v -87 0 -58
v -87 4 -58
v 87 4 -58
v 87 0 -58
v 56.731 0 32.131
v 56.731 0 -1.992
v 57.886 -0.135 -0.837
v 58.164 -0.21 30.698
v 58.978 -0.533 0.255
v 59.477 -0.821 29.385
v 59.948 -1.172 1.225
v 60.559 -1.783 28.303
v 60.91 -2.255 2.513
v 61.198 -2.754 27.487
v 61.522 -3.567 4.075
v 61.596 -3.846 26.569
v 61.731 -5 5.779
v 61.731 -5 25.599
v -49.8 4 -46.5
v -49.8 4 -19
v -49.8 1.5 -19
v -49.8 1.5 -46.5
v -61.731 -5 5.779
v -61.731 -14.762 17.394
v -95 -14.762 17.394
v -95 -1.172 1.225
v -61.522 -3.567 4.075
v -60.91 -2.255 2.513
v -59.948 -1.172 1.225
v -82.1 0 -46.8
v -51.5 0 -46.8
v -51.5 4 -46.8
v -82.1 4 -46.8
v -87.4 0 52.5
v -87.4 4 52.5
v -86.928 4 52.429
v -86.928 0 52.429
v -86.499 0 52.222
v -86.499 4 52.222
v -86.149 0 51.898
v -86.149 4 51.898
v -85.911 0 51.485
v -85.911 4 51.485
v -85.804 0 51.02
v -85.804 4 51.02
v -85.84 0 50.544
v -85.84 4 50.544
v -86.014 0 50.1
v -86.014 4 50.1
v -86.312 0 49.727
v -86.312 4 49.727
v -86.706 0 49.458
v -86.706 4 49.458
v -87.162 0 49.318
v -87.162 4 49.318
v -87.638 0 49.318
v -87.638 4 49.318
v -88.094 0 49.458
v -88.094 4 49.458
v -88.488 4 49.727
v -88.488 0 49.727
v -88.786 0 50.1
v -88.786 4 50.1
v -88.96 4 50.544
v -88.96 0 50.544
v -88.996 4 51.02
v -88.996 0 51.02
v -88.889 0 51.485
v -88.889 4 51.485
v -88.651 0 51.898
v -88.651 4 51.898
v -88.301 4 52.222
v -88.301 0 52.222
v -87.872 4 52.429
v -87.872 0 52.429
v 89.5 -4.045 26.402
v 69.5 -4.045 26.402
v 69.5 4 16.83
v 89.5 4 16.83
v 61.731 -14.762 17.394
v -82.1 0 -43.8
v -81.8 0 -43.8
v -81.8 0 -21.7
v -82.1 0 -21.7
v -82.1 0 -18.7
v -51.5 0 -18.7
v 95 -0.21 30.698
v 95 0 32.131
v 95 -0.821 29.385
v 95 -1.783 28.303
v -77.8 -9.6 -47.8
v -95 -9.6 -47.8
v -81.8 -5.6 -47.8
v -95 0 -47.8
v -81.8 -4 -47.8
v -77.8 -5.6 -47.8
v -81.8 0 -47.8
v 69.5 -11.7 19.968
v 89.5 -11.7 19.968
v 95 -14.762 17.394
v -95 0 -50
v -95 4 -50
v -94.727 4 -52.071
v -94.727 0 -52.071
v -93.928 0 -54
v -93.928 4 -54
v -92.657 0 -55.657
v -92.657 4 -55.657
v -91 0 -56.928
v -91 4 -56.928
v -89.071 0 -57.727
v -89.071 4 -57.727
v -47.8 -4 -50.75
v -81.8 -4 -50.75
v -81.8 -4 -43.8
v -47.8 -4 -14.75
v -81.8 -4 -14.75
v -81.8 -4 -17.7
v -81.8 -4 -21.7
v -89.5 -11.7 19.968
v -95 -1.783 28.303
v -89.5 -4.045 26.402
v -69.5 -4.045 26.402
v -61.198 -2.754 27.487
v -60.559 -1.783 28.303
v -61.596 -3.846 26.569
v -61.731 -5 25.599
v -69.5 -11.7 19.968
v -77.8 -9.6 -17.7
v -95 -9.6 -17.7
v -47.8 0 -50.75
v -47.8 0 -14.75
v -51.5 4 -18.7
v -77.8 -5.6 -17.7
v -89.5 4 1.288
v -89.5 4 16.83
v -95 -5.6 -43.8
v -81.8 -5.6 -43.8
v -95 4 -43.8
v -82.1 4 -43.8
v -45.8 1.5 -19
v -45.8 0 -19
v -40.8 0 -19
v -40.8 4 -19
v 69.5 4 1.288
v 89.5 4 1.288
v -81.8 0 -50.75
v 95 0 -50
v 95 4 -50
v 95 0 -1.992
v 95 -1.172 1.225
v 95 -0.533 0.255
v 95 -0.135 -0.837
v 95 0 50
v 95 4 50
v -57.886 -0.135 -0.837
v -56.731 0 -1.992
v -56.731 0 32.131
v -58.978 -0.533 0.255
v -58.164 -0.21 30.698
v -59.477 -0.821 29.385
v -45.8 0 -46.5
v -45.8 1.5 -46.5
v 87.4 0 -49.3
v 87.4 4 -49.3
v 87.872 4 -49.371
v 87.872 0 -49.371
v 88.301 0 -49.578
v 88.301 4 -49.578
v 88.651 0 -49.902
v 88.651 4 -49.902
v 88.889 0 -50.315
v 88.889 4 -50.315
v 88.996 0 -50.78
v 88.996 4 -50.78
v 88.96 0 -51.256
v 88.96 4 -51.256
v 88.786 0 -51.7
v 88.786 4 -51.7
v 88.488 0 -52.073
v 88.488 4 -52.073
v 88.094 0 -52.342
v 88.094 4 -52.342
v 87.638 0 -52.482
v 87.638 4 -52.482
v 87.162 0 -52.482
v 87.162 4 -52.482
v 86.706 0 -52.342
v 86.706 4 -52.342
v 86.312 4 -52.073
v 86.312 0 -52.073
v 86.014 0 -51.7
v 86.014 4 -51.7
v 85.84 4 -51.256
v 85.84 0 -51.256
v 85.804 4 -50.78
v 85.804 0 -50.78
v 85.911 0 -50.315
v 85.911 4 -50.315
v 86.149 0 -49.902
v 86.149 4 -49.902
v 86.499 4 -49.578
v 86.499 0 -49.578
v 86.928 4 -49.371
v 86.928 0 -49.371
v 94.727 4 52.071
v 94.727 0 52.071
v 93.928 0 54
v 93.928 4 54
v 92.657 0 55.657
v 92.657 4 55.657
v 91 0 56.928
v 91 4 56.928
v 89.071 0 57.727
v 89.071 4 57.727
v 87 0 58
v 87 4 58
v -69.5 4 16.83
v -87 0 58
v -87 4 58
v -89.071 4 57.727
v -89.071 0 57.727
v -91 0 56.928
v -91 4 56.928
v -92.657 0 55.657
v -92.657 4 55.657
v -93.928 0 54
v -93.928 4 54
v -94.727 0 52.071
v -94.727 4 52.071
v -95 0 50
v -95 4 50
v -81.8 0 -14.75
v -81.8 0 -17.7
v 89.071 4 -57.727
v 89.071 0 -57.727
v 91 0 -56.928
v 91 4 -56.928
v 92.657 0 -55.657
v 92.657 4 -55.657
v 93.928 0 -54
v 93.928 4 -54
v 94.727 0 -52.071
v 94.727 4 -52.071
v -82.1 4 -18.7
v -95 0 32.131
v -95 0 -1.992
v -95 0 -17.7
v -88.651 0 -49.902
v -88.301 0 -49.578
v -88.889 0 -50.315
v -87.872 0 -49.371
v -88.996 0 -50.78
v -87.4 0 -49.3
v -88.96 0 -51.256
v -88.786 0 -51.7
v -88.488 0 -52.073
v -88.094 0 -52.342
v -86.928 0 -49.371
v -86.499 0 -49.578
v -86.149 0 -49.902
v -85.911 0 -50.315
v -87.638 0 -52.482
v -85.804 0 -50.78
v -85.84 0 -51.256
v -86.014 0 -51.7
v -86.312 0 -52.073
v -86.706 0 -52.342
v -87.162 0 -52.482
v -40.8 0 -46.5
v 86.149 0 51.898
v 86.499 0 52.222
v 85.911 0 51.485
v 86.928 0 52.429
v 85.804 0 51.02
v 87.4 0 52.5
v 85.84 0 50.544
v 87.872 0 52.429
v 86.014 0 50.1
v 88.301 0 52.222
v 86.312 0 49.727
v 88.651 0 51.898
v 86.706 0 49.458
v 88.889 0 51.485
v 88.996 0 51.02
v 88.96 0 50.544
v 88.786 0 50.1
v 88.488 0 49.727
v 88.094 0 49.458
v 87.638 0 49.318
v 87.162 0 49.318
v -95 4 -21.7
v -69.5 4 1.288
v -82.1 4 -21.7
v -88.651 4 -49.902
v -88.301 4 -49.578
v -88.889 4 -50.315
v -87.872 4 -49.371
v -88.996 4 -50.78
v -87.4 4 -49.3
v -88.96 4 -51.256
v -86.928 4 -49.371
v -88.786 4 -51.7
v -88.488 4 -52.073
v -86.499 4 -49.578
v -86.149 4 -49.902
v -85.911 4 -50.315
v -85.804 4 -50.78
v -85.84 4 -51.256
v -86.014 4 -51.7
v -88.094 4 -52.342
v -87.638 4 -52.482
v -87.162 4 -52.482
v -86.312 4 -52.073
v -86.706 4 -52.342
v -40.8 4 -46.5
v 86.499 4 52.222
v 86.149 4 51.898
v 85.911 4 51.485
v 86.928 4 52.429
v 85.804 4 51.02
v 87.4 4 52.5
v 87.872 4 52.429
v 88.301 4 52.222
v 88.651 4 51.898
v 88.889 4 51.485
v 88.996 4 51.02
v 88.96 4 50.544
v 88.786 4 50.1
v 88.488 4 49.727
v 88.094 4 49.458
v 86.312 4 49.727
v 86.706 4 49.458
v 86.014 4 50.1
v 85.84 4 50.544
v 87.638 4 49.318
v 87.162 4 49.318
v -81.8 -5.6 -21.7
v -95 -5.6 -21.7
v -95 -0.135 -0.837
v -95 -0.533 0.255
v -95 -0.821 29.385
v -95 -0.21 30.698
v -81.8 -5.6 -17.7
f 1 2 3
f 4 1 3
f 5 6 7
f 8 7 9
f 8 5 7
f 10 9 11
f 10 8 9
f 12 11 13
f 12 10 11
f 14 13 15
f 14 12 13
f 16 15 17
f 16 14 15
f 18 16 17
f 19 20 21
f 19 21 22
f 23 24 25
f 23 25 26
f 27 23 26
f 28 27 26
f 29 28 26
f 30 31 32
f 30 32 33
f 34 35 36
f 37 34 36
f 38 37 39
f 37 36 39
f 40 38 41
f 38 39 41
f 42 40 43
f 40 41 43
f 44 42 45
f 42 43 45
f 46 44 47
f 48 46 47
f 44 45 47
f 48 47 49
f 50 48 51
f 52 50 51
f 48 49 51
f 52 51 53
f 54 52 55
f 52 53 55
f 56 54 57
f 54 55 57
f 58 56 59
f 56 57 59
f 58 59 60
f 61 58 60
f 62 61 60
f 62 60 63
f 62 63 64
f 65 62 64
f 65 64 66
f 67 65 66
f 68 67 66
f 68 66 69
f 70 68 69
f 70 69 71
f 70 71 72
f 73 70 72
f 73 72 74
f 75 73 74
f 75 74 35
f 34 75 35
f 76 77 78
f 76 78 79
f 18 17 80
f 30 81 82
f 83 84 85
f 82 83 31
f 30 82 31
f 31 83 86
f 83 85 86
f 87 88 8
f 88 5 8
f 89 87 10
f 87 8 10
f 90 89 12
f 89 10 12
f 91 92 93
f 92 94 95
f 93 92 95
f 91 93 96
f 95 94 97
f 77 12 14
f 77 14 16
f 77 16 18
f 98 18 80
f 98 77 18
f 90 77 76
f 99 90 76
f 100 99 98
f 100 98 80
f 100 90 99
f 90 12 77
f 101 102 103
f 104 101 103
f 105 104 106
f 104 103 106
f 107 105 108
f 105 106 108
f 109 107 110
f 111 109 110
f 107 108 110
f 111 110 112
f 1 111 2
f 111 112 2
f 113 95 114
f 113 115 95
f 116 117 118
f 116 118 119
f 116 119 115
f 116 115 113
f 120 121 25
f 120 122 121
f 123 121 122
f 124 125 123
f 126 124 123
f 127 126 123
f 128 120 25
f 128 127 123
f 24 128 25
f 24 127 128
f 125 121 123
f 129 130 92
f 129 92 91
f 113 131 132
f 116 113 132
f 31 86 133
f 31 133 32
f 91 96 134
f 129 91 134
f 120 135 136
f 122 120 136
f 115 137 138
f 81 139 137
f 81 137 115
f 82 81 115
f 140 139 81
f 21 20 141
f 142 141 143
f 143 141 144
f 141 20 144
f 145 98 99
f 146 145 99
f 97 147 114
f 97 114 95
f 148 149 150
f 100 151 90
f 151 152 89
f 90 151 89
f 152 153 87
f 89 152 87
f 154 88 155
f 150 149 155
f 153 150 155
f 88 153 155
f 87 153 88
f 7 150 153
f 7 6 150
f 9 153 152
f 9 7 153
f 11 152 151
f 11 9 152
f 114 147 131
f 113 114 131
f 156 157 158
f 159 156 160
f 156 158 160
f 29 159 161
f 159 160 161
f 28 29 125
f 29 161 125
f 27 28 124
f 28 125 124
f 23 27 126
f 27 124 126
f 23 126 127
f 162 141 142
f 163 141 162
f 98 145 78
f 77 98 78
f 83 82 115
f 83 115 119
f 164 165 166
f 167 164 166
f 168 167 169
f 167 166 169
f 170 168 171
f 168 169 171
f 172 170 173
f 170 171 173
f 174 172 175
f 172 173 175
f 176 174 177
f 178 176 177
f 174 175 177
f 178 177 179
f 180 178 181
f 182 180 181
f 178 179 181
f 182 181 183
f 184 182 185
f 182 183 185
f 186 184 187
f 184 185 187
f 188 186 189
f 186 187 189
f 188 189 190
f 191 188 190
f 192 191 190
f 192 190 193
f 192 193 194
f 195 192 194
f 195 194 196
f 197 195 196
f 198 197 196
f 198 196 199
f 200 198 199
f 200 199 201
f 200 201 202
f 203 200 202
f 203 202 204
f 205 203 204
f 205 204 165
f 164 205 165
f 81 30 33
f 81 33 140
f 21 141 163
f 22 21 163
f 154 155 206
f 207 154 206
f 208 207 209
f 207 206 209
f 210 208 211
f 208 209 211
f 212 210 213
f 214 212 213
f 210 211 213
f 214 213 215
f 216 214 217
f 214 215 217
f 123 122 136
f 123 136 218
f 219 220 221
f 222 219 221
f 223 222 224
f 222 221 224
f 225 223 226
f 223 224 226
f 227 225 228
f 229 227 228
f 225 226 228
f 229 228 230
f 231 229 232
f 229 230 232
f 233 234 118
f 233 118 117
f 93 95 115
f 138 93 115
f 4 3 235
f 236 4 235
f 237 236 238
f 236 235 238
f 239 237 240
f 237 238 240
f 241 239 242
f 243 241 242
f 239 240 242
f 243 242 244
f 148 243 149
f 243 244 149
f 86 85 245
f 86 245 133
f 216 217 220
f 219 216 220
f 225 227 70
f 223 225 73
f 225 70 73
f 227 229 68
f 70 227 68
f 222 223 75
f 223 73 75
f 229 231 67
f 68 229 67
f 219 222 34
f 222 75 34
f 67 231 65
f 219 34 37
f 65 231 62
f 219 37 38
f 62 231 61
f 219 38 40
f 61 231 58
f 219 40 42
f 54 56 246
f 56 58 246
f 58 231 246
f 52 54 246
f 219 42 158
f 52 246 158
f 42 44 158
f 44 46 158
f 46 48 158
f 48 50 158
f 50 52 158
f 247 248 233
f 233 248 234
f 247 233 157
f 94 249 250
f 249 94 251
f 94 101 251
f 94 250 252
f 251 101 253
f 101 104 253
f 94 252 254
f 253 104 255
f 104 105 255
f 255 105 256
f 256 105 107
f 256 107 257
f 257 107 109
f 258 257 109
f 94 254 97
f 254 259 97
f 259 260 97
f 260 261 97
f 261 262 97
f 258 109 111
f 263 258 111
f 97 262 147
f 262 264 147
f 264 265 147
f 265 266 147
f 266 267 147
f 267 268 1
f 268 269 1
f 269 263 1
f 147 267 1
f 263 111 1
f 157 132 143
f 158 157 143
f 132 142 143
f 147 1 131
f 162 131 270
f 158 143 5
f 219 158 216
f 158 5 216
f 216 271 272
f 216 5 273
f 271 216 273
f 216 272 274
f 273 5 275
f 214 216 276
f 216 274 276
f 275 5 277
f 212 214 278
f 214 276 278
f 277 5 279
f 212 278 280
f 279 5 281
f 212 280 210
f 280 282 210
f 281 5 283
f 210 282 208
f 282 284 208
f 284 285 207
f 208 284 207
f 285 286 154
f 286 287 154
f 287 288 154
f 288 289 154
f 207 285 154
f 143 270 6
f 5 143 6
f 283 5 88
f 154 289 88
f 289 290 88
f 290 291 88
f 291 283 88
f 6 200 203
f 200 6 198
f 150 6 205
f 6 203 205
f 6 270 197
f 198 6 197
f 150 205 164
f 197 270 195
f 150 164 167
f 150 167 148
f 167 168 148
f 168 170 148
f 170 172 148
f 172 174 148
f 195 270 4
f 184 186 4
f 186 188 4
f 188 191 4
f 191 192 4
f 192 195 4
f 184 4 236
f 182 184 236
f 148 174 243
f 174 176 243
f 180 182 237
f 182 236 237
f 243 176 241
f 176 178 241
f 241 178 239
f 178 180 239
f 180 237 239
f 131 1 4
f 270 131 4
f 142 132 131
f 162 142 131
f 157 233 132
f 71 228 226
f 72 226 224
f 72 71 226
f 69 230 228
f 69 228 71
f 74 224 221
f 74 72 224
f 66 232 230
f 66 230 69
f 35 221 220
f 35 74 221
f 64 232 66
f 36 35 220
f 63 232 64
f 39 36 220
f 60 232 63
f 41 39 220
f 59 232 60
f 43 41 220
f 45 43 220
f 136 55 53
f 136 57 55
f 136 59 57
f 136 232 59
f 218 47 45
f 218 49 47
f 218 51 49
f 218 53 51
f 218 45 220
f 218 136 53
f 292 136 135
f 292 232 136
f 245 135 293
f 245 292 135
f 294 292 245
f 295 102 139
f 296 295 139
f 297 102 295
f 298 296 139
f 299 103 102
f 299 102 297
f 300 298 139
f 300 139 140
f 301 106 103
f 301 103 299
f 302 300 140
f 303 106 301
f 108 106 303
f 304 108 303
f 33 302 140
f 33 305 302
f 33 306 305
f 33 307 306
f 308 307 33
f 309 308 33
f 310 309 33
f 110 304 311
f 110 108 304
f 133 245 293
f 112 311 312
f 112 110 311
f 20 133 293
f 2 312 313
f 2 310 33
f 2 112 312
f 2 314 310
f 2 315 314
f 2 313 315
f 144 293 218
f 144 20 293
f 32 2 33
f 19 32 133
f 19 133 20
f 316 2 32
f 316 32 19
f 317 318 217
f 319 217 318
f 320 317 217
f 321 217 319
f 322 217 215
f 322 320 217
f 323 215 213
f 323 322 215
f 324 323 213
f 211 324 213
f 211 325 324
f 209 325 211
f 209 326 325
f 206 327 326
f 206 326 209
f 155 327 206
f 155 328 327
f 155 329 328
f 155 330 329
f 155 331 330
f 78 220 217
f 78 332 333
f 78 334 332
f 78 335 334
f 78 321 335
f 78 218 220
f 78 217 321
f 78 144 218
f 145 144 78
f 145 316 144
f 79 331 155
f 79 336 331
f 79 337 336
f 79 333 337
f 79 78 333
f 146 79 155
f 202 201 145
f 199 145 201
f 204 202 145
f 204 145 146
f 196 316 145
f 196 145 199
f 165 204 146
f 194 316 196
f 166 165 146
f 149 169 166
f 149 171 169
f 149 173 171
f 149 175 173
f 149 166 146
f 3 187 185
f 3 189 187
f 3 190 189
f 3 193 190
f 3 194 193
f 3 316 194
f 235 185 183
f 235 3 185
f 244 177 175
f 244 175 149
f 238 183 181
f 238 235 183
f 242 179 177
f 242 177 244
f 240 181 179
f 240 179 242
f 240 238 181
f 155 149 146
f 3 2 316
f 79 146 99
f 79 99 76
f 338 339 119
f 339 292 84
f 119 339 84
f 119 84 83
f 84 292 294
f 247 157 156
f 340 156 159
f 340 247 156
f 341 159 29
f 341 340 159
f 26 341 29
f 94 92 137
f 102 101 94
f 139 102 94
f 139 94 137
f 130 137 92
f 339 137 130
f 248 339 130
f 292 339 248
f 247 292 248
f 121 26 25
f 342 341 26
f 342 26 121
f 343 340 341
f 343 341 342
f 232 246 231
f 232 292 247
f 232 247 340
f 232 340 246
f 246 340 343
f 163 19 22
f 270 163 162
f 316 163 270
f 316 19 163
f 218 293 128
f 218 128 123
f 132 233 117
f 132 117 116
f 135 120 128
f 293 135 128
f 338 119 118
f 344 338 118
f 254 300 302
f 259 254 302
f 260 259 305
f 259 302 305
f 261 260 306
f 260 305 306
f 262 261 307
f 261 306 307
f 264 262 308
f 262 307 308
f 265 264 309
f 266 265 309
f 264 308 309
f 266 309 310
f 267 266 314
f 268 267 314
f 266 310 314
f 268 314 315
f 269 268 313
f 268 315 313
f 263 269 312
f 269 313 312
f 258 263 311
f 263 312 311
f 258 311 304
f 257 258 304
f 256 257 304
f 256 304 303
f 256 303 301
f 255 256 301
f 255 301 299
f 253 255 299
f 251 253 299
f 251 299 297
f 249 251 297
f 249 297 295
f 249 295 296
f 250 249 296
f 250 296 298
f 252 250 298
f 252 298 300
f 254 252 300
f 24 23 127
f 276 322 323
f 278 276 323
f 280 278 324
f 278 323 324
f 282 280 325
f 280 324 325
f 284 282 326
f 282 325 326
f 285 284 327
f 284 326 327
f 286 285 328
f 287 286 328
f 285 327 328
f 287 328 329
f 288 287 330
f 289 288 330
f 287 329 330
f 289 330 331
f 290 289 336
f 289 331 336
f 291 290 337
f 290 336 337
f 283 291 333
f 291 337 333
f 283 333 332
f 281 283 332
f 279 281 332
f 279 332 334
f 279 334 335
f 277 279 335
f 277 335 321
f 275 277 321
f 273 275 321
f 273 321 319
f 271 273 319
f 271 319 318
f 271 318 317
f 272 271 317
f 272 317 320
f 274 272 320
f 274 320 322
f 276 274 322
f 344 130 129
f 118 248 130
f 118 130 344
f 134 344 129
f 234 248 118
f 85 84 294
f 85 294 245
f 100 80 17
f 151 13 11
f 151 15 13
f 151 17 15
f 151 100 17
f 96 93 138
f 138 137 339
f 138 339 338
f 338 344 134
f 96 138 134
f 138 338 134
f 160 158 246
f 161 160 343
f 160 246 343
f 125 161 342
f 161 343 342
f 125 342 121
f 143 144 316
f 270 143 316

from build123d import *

# Parameters (mm, degrees)
SKETCH_1_W          = 272.533053494
SKETCH_1_H          = 136.587531522
EXTRUDE_1_DEPTH     = 4
SKETCH_2_W          = 272.533053494
SKETCH_2_H          = 136.587531522
CUT_EXTRUDE_1_DEPTH = 4
CUT_EXTRUDE_2_DEPTH = 4
CUT_EXTRUDE_3_DEPTH = 4
SKETCH_5_W          = 34
SKETCH_5_H          = 36
EXTRUDE_2_DEPTH     = 4
SKETCH_6_W          = 13.2
SKETCH_6_H          = 4
EXTRUDE_3_DEPTH     = 5.6
SKETCH_7_W          = 17.2
SKETCH_7_H          = 30.1
EXTRUDE_4_DEPTH     = 4
SKETCH_8_W          = 5
SKETCH_8_H          = 27.5
CUT_EXTRUDE_4_DEPTH = 4
SKETCH_9_W          = 27.5
SKETCH_9_H          = 2.5
CUT_EXTRUDE_5_DEPTH = 4
SKETCH_10_R         = 1.6
CUT_EXTRUDE_6_DEPTH = 10
EXTRUDE_5_DEPTH     = 190
SKETCH_13_W         = 20
SKETCH_13_H         = 10
CUT_EXTRUDE_7_DEPTH = 300
SKETCH_16_W         = 123.462838452
SKETCH_16_H         = 44.826507499
CUT_EXTRUDE_8_DEPTH = 21
FILLET_2_R          = 5


with BuildPart() as part:
    # 草图1 → 凸台-拉伸1 (new body)
    with BuildSketch(Plane(origin=(0, 0, 0), x_dir=(1, 0, 0), z_dir=(0, 1, 0))):
        Rectangle(SKETCH_1_W, SKETCH_1_H)
    extrude(amount=EXTRUDE_1_DEPTH)

    # 草图2 → 切除-拉伸1 (cut)
    with BuildSketch(Plane(origin=(0, 4, 0), x_dir=(1, 0, 0), z_dir=(0, 1, 0))):
        Rectangle(SKETCH_2_W, SKETCH_2_H)
        with BuildLine():
            Line((-87, 58), (87, 58))
            ThreePointArc((87, 58), (92.656854249, 55.656854249), (95, 50))
            Line((95, 50), (95, -50))
            ThreePointArc((95, -50), (92.656854249, -55.656854249), (87, -58))
            Line((87, -58), (-87, -58))
            ThreePointArc((-87, -58), (-92.656854249, -55.656854249), (-95, -50))
            Line((-95, -50), (-95, 50))
            ThreePointArc((-95, 50), (-92.656854249, 55.656854249), (-87, 58))
        make_face(mode=Mode.SUBTRACT)
    extrude(amount=-CUT_EXTRUDE_1_DEPTH, mode=Mode.SUBTRACT)

    # 草图3 → 切除-拉伸2 (cut)
    with BuildSketch(Plane.XZ):
        Polygon((-95, -22), (-81.8, -22), (-81.8, -19), (-51.8, -19), (-51.8, -46.5), (-81.8, -46.5), (-81.8, -43.5), (-95, -43.5), align=None)
    extrude(amount=-CUT_EXTRUDE_2_DEPTH, mode=Mode.SUBTRACT)

    # 草图4 → 切除-拉伸3 (cut)
    with BuildSketch(Plane.XZ):
        Polygon((-51.5, -18.7), (-51.5, -46.8), (-82.1, -46.8), (-82.1, -43.8), (-95, -43.8), (-95, -21.7), (-82.1, -21.7), (-82.1, -18.7), align=None)
    extrude(amount=-CUT_EXTRUDE_3_DEPTH, mode=Mode.SUBTRACT)

    # 草图5 → 凸台-拉伸2 (add)
    with BuildSketch(Plane.XZ):
        with Locations((-64.8, -32.75)):
            Rectangle(SKETCH_5_W, SKETCH_5_H)
    extrude(amount=EXTRUDE_2_DEPTH)

    # 草图6 → 凸台-拉伸3 (add)
    with BuildSketch(Plane.XZ):
        with Locations((-88.4, -19.7)):
            Rectangle(SKETCH_6_W, SKETCH_6_H)
        with Locations((-88.4, -45.8)):
            Rectangle(SKETCH_6_W, SKETCH_6_H)
    extrude(amount=EXTRUDE_3_DEPTH)

    # 草图7 → 凸台-拉伸4 (add)
    with BuildSketch(Plane.XZ.offset(5.6)):
        with Locations((-86.4, -32.75)):
            Rectangle(SKETCH_7_W, SKETCH_7_H)
    extrude(amount=EXTRUDE_4_DEPTH)

    # 草图8 → 切除-拉伸4 (cut)
    with BuildSketch(Plane(origin=(0, 4, 0), x_dir=(1, 0, 0), z_dir=(0, 1, 0))):
        with Locations((-43.3, 32.75)):
            Rectangle(SKETCH_8_W, SKETCH_8_H)
    extrude(amount=-CUT_EXTRUDE_4_DEPTH, mode=Mode.SUBTRACT)

    # 草图9 → 切除-拉伸5 (cut)
    with BuildSketch(Plane(origin=(-45.8, 0, 0), x_dir=(0, 0, -1), z_dir=(1, 0, 0))):
        with Locations((32.75, 2.75)):
            Rectangle(SKETCH_9_W, SKETCH_9_H)
    extrude(amount=-CUT_EXTRUDE_5_DEPTH, mode=Mode.SUBTRACT)

    # 草图10 → 切除-拉伸6 (cut)
    with BuildSketch(Plane(origin=(0, 4, 0), x_dir=(1, 0, 0), z_dir=(0, 1, 0))):
        with Locations(Location((87.4, 50.9, 0), (0, 0, 270))):
            Circle(SKETCH_10_R)
        with Locations(Location((-87.4, 50.9, 0), (0, 0, 270))):
            Circle(SKETCH_10_R)
        with Locations(Location((-87.4, -50.9, 0), (0, 0, 270))):
            Circle(SKETCH_10_R)
        with Locations(Location((87.4, -50.9, 0), (0, 0, 270))):
            Circle(SKETCH_10_R)
    extrude(amount=-CUT_EXTRUDE_6_DEPTH, mode=Mode.SUBTRACT)

    # 草图11 → 凸台-拉伸5 (add)
    with BuildSketch(Plane(origin=(95, 0, 0), x_dir=(0, 0, -1), z_dir=(1, 0, 0))):
        Polygon((0.198533436, 0.024346469), (-29.801466564, 0), (-17.394200934, -14.762056921), align=None)
    extrude(amount=-EXTRUDE_5_DEPTH)

    # 草图13 → 切除-拉伸7 (cut)
    with BuildSketch(Plane(origin=(0, -14.678538072, 17.464397151), x_dir=(1, 0, 0), z_dir=(0, -0.6434090803775565, 0.7655225374133063))):
        with Locations((79.5, 8.890899555)):
            Rectangle(SKETCH_13_W, SKETCH_13_H)
        with Locations((-79.5, 8.890899555)):
            Rectangle(SKETCH_13_W, SKETCH_13_H)
    extrude(amount=-CUT_EXTRUDE_7_DEPTH, mode=Mode.SUBTRACT)

    # 草图16 → 切除-拉伸8 (cut)
    with BuildSketch(Plane.XZ):
        with Locations((0, 10.193598456)):
            Rectangle(SKETCH_16_W, SKETCH_16_H)
    extrude(amount=CUT_EXTRUDE_8_DEPTH, mode=Mode.SUBTRACT)

    # 圆角2
    fillet_2_edges = [part.edges().sort_by_distance(p)[0] for p in [
        (-78.365709613, 0, 29.801466564),
        (-78.365709613, 0, -0.169566218),
        (78.365709613, 0, -0.169566218),
        (78.365709613, 0, 29.801466564),
        (61.731419226, 0, 14.815950173),
        (-61.731419226, 0, 14.815950173),
    ]]
    fillet(fillet_2_edges, radius=FILLET_2_R)


solid = part.part
